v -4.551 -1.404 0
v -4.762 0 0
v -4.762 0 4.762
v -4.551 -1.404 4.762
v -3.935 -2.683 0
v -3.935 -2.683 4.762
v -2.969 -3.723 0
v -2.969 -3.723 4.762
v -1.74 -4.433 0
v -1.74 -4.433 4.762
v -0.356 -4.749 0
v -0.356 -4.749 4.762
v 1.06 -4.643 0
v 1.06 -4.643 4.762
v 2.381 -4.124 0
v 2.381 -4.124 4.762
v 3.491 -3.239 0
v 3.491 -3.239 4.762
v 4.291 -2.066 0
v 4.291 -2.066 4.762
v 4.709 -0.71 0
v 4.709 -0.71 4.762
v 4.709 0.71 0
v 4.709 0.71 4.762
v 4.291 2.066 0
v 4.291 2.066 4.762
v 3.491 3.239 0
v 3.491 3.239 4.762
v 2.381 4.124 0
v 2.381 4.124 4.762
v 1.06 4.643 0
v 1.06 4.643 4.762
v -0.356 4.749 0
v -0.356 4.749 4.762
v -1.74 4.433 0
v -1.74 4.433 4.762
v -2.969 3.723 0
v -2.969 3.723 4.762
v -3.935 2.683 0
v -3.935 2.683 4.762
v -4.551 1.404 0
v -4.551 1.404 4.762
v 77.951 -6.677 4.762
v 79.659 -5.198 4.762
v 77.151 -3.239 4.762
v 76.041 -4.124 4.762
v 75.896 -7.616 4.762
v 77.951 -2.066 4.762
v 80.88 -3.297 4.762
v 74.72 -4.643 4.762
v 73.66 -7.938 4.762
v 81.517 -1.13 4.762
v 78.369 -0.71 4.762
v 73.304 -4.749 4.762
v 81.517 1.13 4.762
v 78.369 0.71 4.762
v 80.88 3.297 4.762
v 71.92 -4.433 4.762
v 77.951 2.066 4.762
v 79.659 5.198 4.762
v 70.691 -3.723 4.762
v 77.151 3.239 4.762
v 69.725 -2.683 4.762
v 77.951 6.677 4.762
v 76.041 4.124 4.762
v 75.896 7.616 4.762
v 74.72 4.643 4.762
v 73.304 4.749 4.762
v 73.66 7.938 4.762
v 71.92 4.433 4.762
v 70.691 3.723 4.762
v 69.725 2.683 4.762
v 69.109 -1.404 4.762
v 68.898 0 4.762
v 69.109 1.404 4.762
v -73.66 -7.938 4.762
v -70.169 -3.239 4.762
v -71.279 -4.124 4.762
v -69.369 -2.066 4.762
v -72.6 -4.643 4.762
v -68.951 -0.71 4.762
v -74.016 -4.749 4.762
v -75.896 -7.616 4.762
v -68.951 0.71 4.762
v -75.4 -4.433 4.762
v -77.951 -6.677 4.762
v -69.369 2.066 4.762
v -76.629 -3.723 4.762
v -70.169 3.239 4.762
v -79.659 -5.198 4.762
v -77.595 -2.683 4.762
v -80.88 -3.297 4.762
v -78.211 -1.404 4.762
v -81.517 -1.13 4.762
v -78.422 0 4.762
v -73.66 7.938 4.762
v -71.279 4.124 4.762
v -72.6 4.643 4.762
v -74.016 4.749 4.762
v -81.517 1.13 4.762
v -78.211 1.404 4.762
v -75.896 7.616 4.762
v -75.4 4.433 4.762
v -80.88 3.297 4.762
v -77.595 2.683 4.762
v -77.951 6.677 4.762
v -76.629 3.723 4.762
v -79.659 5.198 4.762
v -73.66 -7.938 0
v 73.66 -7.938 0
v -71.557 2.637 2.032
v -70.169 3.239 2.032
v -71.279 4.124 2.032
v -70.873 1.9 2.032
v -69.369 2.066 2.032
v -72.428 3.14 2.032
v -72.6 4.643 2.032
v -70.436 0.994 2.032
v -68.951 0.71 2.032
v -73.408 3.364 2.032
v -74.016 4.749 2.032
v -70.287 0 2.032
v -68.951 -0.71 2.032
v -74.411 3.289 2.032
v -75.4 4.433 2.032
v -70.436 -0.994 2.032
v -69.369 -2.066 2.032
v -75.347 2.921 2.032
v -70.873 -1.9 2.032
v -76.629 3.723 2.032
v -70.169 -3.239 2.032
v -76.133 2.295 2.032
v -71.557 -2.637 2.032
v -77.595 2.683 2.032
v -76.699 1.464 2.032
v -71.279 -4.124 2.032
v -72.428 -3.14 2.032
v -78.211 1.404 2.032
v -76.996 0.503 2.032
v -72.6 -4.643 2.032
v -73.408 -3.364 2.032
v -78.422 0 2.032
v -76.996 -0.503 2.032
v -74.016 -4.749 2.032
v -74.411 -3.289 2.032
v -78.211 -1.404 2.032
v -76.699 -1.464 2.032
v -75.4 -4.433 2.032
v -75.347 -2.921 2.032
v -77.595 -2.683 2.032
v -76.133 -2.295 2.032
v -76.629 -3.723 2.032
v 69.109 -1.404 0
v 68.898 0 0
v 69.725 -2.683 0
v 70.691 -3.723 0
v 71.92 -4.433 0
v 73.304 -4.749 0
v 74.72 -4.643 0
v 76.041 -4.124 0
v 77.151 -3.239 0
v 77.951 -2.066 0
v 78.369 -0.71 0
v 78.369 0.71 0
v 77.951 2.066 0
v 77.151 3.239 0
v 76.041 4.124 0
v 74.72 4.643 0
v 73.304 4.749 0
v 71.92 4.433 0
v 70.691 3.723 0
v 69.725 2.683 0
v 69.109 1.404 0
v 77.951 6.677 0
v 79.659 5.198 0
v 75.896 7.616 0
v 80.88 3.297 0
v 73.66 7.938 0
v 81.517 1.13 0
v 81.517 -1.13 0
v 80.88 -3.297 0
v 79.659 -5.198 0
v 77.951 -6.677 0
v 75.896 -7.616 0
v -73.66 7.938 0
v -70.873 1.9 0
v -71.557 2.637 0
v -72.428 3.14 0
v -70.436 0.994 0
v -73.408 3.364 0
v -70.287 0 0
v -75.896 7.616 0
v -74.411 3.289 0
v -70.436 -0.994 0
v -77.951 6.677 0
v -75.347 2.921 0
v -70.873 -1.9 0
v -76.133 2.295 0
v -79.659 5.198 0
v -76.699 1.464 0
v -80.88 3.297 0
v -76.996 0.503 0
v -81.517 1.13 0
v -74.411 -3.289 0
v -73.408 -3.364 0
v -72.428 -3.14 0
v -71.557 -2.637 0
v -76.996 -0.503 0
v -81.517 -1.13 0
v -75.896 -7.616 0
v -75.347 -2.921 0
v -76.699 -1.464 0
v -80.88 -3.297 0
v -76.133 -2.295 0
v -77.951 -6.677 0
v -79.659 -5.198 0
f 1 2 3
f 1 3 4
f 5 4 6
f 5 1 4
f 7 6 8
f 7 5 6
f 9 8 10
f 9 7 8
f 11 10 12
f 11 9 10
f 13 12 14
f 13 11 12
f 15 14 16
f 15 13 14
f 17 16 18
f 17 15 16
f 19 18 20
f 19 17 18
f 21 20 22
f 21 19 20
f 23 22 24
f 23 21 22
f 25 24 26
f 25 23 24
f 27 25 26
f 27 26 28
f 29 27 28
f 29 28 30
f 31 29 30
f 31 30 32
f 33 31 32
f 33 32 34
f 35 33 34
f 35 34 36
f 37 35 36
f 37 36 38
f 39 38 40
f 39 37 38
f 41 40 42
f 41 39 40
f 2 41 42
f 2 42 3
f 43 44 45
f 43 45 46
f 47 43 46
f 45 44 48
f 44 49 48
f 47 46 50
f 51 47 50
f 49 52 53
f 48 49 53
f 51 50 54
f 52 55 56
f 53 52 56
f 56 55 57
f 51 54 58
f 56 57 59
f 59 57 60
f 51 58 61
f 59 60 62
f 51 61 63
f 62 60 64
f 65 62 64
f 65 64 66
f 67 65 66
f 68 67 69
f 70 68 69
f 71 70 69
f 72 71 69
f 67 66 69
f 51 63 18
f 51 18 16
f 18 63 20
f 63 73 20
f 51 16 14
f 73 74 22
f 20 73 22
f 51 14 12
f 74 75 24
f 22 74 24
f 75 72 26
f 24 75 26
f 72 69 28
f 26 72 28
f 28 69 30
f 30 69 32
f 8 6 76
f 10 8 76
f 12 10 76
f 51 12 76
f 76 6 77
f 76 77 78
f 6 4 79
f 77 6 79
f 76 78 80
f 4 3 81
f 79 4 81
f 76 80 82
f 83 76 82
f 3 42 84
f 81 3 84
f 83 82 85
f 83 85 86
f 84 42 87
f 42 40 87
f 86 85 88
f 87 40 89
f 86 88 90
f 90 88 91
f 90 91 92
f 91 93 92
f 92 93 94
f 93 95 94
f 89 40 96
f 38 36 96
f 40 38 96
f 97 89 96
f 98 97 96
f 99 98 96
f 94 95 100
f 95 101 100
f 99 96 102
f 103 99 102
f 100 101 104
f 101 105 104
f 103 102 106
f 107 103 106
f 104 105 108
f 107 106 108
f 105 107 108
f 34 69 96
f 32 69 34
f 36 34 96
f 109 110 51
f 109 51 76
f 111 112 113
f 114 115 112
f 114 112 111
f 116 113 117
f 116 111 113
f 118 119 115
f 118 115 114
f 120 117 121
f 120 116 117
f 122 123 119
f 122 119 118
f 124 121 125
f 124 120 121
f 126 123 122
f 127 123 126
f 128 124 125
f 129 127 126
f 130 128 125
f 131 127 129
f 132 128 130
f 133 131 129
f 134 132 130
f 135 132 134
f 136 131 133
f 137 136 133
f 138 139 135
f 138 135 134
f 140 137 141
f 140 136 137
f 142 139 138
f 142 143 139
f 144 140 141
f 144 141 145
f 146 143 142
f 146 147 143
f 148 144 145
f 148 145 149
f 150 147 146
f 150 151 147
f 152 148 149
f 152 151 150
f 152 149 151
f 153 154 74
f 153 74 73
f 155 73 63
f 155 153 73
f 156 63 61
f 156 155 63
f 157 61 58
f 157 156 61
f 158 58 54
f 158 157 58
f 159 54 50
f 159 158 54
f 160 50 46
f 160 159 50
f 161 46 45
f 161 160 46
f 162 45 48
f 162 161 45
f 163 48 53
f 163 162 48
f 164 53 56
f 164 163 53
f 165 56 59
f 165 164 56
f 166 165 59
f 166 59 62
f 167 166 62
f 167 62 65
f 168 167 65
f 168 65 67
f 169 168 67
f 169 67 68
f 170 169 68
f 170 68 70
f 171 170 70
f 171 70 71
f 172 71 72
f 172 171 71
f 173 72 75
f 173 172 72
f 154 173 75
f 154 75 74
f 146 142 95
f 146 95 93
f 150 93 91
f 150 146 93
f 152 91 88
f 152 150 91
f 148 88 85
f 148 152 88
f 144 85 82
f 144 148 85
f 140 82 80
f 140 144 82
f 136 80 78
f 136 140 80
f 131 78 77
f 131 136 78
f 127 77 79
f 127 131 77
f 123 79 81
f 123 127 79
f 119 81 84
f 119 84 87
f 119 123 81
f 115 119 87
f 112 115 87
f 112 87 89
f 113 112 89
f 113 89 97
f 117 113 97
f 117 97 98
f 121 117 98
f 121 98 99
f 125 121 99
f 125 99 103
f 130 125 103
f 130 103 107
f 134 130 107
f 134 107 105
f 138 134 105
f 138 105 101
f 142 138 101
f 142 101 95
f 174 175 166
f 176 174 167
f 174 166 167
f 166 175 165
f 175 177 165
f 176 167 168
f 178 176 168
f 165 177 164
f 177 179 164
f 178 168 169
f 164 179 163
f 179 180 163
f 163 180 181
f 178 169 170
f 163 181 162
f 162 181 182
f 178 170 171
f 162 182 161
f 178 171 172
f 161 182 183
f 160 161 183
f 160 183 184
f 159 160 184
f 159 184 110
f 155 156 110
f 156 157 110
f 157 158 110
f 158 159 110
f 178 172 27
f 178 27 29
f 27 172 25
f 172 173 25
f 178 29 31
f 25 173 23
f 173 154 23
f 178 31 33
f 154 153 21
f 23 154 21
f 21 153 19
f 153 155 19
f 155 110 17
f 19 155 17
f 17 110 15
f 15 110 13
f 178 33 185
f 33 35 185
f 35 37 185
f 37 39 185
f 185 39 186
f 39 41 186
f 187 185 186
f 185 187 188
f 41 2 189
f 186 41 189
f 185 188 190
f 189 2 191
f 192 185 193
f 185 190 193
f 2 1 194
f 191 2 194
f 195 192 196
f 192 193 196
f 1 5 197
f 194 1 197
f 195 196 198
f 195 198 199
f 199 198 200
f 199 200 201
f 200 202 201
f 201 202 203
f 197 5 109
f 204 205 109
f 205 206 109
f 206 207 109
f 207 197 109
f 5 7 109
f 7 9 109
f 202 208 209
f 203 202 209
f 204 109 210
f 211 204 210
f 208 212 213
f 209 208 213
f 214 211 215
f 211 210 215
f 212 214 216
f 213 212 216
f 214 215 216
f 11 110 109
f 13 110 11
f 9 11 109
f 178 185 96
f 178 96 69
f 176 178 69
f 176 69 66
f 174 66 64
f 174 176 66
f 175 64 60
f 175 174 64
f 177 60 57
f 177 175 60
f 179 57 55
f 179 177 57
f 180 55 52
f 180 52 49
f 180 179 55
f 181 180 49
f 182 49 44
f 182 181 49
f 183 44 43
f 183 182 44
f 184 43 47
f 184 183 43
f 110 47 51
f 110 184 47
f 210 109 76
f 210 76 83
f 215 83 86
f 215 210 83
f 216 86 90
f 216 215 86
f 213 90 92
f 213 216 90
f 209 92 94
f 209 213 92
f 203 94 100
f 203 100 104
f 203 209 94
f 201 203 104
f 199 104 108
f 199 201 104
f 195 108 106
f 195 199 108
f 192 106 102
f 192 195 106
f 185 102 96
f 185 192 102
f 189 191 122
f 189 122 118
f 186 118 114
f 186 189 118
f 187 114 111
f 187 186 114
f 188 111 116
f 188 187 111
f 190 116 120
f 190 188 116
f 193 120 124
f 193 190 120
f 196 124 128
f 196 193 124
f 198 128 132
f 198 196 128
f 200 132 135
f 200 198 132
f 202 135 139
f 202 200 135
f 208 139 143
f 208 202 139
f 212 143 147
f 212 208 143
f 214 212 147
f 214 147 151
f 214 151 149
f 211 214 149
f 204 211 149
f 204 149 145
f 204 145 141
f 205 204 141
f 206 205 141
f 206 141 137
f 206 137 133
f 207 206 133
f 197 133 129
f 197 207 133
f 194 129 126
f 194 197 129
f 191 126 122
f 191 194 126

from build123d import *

# Parameters (mm, degrees)
SKETCH1_R           = 4.7625
BOSS_EXTRUDE1_DEPTH = 4.7625
SKETCH1_2_R         = 4.7625
SKETCH1_2_R_2       = 3.3734375
BOSS_EXTRUDE2_DEPTH = 2.032


with BuildPart() as part:
    # Sketch1 → Boss-Extrude1 (new body)
    with BuildSketch(Plane.XY):
        with BuildLine():
            Line((73.66, 7.9375), (-73.66, 7.9375))
            ThreePointArc((-73.66, 7.9375), (-81.5975, 0), (-73.66, -7.9375))
            Line((-73.66, -7.9375), (73.66, -7.9375))
            ThreePointArc((73.66, -7.9375), (81.5975, 0), (73.66, 7.9375))
        make_face()
        Circle(SKETCH1_R, mode=Mode.SUBTRACT)
        with Locations((-73.66, 0)):
            Circle(SKETCH1_R, mode=Mode.SUBTRACT)
        with Locations((73.66, 0)):
            Circle(SKETCH1_R, mode=Mode.SUBTRACT)
    extrude(amount=BOSS_EXTRUDE1_DEPTH)

    # Sketch1<2> → Boss-Extrude2 (add)
    with BuildSketch(Plane.XY):
        with Locations((-73.66, 0)):
            Circle(SKETCH1_2_R)
        with Locations((-73.66, 0)):
            Circle(SKETCH1_2_R_2, mode=Mode.SUBTRACT)
    extrude(amount=BOSS_EXTRUDE2_DEPTH)


solid = part.part
